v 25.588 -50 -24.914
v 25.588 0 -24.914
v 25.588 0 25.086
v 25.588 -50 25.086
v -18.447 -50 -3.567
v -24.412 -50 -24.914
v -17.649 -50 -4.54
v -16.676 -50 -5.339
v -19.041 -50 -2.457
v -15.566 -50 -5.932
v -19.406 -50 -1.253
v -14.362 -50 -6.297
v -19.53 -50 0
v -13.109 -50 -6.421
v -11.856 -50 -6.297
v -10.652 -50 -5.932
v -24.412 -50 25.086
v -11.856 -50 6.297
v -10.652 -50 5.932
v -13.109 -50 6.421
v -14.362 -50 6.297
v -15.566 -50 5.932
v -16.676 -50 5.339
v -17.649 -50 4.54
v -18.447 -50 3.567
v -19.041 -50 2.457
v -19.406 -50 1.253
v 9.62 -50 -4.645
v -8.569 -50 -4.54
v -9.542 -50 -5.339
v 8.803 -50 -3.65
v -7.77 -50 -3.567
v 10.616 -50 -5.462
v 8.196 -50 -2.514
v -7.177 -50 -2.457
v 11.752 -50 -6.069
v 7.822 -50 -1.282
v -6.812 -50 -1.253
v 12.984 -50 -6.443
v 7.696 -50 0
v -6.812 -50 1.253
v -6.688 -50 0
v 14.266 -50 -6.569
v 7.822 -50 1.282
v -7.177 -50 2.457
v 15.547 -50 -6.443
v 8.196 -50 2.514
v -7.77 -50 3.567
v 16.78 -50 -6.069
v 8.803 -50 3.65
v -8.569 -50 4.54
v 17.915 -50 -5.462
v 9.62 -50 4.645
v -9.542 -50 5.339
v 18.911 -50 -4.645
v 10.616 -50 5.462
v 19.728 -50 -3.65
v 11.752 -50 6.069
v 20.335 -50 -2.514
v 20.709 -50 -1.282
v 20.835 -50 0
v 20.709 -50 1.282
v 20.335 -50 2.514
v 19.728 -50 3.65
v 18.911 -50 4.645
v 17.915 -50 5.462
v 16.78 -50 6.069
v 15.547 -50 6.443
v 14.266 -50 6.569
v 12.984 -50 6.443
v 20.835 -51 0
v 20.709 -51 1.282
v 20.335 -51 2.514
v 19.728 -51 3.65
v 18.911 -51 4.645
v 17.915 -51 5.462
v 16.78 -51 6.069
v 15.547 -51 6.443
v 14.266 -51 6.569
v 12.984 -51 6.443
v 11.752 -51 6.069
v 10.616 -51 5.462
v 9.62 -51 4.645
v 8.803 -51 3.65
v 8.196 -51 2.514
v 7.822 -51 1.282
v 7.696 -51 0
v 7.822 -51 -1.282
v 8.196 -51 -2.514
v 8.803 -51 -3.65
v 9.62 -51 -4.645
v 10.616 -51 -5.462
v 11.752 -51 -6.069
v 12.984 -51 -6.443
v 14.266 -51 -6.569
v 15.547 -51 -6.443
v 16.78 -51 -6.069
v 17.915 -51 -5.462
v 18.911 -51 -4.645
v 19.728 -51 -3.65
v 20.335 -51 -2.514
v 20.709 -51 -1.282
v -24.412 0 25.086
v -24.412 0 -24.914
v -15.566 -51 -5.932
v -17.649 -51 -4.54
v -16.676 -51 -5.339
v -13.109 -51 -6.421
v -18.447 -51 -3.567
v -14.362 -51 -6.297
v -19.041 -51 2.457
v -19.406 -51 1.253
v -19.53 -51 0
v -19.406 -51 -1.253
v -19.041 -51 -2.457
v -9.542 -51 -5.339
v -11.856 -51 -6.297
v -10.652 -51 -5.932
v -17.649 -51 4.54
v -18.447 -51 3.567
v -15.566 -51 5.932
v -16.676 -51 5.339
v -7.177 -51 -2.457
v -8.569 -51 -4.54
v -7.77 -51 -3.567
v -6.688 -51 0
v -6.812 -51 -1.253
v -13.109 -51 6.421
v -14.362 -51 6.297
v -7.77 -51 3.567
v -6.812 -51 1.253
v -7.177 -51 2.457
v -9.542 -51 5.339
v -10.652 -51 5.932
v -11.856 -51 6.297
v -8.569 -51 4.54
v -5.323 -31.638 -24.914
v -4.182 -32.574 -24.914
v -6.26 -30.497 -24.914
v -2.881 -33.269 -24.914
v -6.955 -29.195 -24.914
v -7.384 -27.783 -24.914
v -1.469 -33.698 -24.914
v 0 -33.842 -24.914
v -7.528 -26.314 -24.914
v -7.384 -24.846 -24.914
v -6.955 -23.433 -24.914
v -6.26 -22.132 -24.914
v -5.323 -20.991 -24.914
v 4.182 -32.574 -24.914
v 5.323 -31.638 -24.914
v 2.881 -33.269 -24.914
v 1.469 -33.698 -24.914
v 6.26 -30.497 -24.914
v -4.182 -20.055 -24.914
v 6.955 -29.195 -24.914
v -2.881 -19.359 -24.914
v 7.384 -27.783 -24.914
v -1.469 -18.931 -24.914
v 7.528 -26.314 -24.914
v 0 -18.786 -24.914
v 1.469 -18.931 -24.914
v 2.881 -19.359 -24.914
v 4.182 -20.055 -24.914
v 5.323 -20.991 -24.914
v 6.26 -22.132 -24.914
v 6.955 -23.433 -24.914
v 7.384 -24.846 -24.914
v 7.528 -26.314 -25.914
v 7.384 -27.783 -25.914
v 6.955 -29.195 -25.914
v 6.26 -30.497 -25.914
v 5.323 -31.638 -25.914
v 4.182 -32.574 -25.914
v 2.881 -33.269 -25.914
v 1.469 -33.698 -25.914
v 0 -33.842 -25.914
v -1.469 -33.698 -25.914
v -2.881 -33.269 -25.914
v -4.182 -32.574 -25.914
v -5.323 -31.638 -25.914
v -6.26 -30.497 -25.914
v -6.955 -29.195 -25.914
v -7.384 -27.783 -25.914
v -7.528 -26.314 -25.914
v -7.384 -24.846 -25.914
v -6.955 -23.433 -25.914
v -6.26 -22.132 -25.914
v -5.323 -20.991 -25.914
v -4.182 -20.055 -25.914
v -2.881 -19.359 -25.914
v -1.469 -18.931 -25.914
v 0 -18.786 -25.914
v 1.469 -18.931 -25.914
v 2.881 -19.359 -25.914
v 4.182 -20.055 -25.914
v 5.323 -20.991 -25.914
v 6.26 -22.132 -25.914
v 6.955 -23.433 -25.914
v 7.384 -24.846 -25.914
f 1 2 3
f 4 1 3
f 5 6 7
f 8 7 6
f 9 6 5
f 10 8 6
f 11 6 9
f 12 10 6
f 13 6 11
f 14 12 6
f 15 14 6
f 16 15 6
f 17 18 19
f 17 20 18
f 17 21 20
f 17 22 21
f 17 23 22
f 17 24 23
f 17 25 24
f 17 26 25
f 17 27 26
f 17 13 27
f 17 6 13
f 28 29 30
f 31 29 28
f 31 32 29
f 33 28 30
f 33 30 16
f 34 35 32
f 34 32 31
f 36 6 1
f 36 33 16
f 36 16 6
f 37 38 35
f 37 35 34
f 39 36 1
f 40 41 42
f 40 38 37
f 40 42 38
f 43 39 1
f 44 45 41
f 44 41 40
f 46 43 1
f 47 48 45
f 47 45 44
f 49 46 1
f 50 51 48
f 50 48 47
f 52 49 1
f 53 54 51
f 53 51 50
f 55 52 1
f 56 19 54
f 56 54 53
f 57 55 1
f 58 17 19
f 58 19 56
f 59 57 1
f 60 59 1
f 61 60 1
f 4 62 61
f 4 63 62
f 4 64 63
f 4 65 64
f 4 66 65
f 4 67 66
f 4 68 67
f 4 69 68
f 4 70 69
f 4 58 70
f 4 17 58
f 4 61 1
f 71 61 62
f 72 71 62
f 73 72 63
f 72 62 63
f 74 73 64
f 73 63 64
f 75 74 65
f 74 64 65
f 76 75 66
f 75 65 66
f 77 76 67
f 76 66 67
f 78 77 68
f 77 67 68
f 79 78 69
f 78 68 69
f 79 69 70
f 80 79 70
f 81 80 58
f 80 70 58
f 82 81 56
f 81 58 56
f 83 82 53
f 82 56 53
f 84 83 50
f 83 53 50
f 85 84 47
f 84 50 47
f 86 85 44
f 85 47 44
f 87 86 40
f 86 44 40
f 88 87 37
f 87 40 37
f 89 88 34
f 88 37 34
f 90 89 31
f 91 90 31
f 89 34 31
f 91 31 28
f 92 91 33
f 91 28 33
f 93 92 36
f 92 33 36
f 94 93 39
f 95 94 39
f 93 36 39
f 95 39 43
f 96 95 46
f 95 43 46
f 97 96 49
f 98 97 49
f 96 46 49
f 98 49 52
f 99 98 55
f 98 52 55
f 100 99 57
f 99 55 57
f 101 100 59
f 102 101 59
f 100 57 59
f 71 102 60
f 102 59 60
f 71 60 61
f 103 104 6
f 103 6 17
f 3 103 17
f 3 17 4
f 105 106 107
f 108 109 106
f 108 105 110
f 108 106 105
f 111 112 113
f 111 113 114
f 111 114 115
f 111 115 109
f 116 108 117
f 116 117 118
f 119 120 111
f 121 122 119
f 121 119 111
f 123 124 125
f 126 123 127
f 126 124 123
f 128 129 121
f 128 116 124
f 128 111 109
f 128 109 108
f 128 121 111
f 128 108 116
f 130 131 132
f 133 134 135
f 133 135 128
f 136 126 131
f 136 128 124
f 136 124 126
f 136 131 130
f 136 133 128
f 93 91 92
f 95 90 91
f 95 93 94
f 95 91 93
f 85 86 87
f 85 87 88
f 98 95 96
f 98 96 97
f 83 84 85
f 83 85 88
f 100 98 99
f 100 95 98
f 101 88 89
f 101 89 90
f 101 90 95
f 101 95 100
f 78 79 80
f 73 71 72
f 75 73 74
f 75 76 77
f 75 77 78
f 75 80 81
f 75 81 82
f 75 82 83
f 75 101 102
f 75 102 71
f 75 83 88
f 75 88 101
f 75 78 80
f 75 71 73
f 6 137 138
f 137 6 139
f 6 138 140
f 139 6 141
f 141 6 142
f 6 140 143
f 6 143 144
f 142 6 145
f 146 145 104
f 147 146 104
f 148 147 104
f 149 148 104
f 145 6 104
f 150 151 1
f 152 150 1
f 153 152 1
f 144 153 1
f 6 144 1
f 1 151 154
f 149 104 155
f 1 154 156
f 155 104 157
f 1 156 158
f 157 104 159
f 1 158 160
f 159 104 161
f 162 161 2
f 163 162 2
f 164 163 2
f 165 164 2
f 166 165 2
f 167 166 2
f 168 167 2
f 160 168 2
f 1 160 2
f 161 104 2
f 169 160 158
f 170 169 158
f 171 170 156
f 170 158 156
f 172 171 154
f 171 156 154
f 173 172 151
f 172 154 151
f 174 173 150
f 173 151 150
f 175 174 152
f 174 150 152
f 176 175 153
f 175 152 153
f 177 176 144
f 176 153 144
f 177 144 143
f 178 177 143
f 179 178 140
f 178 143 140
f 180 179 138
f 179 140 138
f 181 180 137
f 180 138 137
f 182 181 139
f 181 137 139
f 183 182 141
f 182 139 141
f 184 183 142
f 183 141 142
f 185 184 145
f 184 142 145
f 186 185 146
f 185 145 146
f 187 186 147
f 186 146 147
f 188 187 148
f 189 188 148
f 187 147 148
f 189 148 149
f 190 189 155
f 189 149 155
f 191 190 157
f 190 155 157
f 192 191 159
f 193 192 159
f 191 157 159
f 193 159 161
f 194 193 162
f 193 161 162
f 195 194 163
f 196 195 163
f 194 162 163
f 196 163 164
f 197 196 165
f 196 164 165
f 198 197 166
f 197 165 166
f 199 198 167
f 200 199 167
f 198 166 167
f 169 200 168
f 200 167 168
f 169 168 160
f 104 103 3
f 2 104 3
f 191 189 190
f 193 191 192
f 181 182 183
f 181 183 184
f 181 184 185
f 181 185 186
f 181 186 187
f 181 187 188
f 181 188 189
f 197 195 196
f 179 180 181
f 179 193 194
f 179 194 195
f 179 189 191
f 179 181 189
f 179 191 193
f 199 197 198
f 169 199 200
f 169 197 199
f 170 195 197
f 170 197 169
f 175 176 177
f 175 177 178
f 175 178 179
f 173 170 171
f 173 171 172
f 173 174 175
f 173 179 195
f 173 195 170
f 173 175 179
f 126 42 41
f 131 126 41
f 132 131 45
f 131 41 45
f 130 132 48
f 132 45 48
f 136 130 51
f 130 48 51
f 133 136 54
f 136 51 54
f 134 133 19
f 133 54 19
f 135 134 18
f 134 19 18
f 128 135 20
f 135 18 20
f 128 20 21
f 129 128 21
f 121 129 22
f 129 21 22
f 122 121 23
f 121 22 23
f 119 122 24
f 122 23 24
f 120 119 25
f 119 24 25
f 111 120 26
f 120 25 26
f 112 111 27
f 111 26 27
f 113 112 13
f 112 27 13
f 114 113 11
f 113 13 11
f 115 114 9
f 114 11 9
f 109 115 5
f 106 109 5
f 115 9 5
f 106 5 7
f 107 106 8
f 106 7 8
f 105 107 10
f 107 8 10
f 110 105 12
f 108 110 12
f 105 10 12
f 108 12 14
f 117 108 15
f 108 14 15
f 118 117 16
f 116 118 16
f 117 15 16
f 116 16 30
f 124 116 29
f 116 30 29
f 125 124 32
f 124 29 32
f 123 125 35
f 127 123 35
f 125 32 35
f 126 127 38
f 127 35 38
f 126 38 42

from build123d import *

# Parameters (mm, degrees)
F0_W     = 50
F0_H     = 50
F1_DEPTH = 50
F2_R     = 7.52824
F3_DEPTH = 1
F4_R     = 6.420566
F4_R_2   = 6.569333
F5_DEPTH = 1


with BuildPart() as f1:
    # F0 (on Front) → F1 (new body)
    with BuildSketch(Plane.XZ):
        with Locations((0.587589, 0.085707)):
            Rectangle(F0_W, F0_H)
    extrude(amount=F1_DEPTH)

    # F2 (on face) → F3 (join)
    with BuildSketch(Plane(origin=(0, 0, -24.914293), x_dir=(1, 0, 0), z_dir=(0, 0, -1))):
        with Locations((0, 26.31426)):
            Circle(F2_R)
    extrude(amount=F3_DEPTH)

    # F4 (on face) → F5 (join)
    with BuildSketch(Plane.XZ.offset(50)):
        with Locations((-13.108936, 0)):
            Circle(F4_R)
        with Locations((14.265605, 0)):
            Circle(F4_R_2)
    extrude(amount=F5_DEPTH)


solid = f1.part
